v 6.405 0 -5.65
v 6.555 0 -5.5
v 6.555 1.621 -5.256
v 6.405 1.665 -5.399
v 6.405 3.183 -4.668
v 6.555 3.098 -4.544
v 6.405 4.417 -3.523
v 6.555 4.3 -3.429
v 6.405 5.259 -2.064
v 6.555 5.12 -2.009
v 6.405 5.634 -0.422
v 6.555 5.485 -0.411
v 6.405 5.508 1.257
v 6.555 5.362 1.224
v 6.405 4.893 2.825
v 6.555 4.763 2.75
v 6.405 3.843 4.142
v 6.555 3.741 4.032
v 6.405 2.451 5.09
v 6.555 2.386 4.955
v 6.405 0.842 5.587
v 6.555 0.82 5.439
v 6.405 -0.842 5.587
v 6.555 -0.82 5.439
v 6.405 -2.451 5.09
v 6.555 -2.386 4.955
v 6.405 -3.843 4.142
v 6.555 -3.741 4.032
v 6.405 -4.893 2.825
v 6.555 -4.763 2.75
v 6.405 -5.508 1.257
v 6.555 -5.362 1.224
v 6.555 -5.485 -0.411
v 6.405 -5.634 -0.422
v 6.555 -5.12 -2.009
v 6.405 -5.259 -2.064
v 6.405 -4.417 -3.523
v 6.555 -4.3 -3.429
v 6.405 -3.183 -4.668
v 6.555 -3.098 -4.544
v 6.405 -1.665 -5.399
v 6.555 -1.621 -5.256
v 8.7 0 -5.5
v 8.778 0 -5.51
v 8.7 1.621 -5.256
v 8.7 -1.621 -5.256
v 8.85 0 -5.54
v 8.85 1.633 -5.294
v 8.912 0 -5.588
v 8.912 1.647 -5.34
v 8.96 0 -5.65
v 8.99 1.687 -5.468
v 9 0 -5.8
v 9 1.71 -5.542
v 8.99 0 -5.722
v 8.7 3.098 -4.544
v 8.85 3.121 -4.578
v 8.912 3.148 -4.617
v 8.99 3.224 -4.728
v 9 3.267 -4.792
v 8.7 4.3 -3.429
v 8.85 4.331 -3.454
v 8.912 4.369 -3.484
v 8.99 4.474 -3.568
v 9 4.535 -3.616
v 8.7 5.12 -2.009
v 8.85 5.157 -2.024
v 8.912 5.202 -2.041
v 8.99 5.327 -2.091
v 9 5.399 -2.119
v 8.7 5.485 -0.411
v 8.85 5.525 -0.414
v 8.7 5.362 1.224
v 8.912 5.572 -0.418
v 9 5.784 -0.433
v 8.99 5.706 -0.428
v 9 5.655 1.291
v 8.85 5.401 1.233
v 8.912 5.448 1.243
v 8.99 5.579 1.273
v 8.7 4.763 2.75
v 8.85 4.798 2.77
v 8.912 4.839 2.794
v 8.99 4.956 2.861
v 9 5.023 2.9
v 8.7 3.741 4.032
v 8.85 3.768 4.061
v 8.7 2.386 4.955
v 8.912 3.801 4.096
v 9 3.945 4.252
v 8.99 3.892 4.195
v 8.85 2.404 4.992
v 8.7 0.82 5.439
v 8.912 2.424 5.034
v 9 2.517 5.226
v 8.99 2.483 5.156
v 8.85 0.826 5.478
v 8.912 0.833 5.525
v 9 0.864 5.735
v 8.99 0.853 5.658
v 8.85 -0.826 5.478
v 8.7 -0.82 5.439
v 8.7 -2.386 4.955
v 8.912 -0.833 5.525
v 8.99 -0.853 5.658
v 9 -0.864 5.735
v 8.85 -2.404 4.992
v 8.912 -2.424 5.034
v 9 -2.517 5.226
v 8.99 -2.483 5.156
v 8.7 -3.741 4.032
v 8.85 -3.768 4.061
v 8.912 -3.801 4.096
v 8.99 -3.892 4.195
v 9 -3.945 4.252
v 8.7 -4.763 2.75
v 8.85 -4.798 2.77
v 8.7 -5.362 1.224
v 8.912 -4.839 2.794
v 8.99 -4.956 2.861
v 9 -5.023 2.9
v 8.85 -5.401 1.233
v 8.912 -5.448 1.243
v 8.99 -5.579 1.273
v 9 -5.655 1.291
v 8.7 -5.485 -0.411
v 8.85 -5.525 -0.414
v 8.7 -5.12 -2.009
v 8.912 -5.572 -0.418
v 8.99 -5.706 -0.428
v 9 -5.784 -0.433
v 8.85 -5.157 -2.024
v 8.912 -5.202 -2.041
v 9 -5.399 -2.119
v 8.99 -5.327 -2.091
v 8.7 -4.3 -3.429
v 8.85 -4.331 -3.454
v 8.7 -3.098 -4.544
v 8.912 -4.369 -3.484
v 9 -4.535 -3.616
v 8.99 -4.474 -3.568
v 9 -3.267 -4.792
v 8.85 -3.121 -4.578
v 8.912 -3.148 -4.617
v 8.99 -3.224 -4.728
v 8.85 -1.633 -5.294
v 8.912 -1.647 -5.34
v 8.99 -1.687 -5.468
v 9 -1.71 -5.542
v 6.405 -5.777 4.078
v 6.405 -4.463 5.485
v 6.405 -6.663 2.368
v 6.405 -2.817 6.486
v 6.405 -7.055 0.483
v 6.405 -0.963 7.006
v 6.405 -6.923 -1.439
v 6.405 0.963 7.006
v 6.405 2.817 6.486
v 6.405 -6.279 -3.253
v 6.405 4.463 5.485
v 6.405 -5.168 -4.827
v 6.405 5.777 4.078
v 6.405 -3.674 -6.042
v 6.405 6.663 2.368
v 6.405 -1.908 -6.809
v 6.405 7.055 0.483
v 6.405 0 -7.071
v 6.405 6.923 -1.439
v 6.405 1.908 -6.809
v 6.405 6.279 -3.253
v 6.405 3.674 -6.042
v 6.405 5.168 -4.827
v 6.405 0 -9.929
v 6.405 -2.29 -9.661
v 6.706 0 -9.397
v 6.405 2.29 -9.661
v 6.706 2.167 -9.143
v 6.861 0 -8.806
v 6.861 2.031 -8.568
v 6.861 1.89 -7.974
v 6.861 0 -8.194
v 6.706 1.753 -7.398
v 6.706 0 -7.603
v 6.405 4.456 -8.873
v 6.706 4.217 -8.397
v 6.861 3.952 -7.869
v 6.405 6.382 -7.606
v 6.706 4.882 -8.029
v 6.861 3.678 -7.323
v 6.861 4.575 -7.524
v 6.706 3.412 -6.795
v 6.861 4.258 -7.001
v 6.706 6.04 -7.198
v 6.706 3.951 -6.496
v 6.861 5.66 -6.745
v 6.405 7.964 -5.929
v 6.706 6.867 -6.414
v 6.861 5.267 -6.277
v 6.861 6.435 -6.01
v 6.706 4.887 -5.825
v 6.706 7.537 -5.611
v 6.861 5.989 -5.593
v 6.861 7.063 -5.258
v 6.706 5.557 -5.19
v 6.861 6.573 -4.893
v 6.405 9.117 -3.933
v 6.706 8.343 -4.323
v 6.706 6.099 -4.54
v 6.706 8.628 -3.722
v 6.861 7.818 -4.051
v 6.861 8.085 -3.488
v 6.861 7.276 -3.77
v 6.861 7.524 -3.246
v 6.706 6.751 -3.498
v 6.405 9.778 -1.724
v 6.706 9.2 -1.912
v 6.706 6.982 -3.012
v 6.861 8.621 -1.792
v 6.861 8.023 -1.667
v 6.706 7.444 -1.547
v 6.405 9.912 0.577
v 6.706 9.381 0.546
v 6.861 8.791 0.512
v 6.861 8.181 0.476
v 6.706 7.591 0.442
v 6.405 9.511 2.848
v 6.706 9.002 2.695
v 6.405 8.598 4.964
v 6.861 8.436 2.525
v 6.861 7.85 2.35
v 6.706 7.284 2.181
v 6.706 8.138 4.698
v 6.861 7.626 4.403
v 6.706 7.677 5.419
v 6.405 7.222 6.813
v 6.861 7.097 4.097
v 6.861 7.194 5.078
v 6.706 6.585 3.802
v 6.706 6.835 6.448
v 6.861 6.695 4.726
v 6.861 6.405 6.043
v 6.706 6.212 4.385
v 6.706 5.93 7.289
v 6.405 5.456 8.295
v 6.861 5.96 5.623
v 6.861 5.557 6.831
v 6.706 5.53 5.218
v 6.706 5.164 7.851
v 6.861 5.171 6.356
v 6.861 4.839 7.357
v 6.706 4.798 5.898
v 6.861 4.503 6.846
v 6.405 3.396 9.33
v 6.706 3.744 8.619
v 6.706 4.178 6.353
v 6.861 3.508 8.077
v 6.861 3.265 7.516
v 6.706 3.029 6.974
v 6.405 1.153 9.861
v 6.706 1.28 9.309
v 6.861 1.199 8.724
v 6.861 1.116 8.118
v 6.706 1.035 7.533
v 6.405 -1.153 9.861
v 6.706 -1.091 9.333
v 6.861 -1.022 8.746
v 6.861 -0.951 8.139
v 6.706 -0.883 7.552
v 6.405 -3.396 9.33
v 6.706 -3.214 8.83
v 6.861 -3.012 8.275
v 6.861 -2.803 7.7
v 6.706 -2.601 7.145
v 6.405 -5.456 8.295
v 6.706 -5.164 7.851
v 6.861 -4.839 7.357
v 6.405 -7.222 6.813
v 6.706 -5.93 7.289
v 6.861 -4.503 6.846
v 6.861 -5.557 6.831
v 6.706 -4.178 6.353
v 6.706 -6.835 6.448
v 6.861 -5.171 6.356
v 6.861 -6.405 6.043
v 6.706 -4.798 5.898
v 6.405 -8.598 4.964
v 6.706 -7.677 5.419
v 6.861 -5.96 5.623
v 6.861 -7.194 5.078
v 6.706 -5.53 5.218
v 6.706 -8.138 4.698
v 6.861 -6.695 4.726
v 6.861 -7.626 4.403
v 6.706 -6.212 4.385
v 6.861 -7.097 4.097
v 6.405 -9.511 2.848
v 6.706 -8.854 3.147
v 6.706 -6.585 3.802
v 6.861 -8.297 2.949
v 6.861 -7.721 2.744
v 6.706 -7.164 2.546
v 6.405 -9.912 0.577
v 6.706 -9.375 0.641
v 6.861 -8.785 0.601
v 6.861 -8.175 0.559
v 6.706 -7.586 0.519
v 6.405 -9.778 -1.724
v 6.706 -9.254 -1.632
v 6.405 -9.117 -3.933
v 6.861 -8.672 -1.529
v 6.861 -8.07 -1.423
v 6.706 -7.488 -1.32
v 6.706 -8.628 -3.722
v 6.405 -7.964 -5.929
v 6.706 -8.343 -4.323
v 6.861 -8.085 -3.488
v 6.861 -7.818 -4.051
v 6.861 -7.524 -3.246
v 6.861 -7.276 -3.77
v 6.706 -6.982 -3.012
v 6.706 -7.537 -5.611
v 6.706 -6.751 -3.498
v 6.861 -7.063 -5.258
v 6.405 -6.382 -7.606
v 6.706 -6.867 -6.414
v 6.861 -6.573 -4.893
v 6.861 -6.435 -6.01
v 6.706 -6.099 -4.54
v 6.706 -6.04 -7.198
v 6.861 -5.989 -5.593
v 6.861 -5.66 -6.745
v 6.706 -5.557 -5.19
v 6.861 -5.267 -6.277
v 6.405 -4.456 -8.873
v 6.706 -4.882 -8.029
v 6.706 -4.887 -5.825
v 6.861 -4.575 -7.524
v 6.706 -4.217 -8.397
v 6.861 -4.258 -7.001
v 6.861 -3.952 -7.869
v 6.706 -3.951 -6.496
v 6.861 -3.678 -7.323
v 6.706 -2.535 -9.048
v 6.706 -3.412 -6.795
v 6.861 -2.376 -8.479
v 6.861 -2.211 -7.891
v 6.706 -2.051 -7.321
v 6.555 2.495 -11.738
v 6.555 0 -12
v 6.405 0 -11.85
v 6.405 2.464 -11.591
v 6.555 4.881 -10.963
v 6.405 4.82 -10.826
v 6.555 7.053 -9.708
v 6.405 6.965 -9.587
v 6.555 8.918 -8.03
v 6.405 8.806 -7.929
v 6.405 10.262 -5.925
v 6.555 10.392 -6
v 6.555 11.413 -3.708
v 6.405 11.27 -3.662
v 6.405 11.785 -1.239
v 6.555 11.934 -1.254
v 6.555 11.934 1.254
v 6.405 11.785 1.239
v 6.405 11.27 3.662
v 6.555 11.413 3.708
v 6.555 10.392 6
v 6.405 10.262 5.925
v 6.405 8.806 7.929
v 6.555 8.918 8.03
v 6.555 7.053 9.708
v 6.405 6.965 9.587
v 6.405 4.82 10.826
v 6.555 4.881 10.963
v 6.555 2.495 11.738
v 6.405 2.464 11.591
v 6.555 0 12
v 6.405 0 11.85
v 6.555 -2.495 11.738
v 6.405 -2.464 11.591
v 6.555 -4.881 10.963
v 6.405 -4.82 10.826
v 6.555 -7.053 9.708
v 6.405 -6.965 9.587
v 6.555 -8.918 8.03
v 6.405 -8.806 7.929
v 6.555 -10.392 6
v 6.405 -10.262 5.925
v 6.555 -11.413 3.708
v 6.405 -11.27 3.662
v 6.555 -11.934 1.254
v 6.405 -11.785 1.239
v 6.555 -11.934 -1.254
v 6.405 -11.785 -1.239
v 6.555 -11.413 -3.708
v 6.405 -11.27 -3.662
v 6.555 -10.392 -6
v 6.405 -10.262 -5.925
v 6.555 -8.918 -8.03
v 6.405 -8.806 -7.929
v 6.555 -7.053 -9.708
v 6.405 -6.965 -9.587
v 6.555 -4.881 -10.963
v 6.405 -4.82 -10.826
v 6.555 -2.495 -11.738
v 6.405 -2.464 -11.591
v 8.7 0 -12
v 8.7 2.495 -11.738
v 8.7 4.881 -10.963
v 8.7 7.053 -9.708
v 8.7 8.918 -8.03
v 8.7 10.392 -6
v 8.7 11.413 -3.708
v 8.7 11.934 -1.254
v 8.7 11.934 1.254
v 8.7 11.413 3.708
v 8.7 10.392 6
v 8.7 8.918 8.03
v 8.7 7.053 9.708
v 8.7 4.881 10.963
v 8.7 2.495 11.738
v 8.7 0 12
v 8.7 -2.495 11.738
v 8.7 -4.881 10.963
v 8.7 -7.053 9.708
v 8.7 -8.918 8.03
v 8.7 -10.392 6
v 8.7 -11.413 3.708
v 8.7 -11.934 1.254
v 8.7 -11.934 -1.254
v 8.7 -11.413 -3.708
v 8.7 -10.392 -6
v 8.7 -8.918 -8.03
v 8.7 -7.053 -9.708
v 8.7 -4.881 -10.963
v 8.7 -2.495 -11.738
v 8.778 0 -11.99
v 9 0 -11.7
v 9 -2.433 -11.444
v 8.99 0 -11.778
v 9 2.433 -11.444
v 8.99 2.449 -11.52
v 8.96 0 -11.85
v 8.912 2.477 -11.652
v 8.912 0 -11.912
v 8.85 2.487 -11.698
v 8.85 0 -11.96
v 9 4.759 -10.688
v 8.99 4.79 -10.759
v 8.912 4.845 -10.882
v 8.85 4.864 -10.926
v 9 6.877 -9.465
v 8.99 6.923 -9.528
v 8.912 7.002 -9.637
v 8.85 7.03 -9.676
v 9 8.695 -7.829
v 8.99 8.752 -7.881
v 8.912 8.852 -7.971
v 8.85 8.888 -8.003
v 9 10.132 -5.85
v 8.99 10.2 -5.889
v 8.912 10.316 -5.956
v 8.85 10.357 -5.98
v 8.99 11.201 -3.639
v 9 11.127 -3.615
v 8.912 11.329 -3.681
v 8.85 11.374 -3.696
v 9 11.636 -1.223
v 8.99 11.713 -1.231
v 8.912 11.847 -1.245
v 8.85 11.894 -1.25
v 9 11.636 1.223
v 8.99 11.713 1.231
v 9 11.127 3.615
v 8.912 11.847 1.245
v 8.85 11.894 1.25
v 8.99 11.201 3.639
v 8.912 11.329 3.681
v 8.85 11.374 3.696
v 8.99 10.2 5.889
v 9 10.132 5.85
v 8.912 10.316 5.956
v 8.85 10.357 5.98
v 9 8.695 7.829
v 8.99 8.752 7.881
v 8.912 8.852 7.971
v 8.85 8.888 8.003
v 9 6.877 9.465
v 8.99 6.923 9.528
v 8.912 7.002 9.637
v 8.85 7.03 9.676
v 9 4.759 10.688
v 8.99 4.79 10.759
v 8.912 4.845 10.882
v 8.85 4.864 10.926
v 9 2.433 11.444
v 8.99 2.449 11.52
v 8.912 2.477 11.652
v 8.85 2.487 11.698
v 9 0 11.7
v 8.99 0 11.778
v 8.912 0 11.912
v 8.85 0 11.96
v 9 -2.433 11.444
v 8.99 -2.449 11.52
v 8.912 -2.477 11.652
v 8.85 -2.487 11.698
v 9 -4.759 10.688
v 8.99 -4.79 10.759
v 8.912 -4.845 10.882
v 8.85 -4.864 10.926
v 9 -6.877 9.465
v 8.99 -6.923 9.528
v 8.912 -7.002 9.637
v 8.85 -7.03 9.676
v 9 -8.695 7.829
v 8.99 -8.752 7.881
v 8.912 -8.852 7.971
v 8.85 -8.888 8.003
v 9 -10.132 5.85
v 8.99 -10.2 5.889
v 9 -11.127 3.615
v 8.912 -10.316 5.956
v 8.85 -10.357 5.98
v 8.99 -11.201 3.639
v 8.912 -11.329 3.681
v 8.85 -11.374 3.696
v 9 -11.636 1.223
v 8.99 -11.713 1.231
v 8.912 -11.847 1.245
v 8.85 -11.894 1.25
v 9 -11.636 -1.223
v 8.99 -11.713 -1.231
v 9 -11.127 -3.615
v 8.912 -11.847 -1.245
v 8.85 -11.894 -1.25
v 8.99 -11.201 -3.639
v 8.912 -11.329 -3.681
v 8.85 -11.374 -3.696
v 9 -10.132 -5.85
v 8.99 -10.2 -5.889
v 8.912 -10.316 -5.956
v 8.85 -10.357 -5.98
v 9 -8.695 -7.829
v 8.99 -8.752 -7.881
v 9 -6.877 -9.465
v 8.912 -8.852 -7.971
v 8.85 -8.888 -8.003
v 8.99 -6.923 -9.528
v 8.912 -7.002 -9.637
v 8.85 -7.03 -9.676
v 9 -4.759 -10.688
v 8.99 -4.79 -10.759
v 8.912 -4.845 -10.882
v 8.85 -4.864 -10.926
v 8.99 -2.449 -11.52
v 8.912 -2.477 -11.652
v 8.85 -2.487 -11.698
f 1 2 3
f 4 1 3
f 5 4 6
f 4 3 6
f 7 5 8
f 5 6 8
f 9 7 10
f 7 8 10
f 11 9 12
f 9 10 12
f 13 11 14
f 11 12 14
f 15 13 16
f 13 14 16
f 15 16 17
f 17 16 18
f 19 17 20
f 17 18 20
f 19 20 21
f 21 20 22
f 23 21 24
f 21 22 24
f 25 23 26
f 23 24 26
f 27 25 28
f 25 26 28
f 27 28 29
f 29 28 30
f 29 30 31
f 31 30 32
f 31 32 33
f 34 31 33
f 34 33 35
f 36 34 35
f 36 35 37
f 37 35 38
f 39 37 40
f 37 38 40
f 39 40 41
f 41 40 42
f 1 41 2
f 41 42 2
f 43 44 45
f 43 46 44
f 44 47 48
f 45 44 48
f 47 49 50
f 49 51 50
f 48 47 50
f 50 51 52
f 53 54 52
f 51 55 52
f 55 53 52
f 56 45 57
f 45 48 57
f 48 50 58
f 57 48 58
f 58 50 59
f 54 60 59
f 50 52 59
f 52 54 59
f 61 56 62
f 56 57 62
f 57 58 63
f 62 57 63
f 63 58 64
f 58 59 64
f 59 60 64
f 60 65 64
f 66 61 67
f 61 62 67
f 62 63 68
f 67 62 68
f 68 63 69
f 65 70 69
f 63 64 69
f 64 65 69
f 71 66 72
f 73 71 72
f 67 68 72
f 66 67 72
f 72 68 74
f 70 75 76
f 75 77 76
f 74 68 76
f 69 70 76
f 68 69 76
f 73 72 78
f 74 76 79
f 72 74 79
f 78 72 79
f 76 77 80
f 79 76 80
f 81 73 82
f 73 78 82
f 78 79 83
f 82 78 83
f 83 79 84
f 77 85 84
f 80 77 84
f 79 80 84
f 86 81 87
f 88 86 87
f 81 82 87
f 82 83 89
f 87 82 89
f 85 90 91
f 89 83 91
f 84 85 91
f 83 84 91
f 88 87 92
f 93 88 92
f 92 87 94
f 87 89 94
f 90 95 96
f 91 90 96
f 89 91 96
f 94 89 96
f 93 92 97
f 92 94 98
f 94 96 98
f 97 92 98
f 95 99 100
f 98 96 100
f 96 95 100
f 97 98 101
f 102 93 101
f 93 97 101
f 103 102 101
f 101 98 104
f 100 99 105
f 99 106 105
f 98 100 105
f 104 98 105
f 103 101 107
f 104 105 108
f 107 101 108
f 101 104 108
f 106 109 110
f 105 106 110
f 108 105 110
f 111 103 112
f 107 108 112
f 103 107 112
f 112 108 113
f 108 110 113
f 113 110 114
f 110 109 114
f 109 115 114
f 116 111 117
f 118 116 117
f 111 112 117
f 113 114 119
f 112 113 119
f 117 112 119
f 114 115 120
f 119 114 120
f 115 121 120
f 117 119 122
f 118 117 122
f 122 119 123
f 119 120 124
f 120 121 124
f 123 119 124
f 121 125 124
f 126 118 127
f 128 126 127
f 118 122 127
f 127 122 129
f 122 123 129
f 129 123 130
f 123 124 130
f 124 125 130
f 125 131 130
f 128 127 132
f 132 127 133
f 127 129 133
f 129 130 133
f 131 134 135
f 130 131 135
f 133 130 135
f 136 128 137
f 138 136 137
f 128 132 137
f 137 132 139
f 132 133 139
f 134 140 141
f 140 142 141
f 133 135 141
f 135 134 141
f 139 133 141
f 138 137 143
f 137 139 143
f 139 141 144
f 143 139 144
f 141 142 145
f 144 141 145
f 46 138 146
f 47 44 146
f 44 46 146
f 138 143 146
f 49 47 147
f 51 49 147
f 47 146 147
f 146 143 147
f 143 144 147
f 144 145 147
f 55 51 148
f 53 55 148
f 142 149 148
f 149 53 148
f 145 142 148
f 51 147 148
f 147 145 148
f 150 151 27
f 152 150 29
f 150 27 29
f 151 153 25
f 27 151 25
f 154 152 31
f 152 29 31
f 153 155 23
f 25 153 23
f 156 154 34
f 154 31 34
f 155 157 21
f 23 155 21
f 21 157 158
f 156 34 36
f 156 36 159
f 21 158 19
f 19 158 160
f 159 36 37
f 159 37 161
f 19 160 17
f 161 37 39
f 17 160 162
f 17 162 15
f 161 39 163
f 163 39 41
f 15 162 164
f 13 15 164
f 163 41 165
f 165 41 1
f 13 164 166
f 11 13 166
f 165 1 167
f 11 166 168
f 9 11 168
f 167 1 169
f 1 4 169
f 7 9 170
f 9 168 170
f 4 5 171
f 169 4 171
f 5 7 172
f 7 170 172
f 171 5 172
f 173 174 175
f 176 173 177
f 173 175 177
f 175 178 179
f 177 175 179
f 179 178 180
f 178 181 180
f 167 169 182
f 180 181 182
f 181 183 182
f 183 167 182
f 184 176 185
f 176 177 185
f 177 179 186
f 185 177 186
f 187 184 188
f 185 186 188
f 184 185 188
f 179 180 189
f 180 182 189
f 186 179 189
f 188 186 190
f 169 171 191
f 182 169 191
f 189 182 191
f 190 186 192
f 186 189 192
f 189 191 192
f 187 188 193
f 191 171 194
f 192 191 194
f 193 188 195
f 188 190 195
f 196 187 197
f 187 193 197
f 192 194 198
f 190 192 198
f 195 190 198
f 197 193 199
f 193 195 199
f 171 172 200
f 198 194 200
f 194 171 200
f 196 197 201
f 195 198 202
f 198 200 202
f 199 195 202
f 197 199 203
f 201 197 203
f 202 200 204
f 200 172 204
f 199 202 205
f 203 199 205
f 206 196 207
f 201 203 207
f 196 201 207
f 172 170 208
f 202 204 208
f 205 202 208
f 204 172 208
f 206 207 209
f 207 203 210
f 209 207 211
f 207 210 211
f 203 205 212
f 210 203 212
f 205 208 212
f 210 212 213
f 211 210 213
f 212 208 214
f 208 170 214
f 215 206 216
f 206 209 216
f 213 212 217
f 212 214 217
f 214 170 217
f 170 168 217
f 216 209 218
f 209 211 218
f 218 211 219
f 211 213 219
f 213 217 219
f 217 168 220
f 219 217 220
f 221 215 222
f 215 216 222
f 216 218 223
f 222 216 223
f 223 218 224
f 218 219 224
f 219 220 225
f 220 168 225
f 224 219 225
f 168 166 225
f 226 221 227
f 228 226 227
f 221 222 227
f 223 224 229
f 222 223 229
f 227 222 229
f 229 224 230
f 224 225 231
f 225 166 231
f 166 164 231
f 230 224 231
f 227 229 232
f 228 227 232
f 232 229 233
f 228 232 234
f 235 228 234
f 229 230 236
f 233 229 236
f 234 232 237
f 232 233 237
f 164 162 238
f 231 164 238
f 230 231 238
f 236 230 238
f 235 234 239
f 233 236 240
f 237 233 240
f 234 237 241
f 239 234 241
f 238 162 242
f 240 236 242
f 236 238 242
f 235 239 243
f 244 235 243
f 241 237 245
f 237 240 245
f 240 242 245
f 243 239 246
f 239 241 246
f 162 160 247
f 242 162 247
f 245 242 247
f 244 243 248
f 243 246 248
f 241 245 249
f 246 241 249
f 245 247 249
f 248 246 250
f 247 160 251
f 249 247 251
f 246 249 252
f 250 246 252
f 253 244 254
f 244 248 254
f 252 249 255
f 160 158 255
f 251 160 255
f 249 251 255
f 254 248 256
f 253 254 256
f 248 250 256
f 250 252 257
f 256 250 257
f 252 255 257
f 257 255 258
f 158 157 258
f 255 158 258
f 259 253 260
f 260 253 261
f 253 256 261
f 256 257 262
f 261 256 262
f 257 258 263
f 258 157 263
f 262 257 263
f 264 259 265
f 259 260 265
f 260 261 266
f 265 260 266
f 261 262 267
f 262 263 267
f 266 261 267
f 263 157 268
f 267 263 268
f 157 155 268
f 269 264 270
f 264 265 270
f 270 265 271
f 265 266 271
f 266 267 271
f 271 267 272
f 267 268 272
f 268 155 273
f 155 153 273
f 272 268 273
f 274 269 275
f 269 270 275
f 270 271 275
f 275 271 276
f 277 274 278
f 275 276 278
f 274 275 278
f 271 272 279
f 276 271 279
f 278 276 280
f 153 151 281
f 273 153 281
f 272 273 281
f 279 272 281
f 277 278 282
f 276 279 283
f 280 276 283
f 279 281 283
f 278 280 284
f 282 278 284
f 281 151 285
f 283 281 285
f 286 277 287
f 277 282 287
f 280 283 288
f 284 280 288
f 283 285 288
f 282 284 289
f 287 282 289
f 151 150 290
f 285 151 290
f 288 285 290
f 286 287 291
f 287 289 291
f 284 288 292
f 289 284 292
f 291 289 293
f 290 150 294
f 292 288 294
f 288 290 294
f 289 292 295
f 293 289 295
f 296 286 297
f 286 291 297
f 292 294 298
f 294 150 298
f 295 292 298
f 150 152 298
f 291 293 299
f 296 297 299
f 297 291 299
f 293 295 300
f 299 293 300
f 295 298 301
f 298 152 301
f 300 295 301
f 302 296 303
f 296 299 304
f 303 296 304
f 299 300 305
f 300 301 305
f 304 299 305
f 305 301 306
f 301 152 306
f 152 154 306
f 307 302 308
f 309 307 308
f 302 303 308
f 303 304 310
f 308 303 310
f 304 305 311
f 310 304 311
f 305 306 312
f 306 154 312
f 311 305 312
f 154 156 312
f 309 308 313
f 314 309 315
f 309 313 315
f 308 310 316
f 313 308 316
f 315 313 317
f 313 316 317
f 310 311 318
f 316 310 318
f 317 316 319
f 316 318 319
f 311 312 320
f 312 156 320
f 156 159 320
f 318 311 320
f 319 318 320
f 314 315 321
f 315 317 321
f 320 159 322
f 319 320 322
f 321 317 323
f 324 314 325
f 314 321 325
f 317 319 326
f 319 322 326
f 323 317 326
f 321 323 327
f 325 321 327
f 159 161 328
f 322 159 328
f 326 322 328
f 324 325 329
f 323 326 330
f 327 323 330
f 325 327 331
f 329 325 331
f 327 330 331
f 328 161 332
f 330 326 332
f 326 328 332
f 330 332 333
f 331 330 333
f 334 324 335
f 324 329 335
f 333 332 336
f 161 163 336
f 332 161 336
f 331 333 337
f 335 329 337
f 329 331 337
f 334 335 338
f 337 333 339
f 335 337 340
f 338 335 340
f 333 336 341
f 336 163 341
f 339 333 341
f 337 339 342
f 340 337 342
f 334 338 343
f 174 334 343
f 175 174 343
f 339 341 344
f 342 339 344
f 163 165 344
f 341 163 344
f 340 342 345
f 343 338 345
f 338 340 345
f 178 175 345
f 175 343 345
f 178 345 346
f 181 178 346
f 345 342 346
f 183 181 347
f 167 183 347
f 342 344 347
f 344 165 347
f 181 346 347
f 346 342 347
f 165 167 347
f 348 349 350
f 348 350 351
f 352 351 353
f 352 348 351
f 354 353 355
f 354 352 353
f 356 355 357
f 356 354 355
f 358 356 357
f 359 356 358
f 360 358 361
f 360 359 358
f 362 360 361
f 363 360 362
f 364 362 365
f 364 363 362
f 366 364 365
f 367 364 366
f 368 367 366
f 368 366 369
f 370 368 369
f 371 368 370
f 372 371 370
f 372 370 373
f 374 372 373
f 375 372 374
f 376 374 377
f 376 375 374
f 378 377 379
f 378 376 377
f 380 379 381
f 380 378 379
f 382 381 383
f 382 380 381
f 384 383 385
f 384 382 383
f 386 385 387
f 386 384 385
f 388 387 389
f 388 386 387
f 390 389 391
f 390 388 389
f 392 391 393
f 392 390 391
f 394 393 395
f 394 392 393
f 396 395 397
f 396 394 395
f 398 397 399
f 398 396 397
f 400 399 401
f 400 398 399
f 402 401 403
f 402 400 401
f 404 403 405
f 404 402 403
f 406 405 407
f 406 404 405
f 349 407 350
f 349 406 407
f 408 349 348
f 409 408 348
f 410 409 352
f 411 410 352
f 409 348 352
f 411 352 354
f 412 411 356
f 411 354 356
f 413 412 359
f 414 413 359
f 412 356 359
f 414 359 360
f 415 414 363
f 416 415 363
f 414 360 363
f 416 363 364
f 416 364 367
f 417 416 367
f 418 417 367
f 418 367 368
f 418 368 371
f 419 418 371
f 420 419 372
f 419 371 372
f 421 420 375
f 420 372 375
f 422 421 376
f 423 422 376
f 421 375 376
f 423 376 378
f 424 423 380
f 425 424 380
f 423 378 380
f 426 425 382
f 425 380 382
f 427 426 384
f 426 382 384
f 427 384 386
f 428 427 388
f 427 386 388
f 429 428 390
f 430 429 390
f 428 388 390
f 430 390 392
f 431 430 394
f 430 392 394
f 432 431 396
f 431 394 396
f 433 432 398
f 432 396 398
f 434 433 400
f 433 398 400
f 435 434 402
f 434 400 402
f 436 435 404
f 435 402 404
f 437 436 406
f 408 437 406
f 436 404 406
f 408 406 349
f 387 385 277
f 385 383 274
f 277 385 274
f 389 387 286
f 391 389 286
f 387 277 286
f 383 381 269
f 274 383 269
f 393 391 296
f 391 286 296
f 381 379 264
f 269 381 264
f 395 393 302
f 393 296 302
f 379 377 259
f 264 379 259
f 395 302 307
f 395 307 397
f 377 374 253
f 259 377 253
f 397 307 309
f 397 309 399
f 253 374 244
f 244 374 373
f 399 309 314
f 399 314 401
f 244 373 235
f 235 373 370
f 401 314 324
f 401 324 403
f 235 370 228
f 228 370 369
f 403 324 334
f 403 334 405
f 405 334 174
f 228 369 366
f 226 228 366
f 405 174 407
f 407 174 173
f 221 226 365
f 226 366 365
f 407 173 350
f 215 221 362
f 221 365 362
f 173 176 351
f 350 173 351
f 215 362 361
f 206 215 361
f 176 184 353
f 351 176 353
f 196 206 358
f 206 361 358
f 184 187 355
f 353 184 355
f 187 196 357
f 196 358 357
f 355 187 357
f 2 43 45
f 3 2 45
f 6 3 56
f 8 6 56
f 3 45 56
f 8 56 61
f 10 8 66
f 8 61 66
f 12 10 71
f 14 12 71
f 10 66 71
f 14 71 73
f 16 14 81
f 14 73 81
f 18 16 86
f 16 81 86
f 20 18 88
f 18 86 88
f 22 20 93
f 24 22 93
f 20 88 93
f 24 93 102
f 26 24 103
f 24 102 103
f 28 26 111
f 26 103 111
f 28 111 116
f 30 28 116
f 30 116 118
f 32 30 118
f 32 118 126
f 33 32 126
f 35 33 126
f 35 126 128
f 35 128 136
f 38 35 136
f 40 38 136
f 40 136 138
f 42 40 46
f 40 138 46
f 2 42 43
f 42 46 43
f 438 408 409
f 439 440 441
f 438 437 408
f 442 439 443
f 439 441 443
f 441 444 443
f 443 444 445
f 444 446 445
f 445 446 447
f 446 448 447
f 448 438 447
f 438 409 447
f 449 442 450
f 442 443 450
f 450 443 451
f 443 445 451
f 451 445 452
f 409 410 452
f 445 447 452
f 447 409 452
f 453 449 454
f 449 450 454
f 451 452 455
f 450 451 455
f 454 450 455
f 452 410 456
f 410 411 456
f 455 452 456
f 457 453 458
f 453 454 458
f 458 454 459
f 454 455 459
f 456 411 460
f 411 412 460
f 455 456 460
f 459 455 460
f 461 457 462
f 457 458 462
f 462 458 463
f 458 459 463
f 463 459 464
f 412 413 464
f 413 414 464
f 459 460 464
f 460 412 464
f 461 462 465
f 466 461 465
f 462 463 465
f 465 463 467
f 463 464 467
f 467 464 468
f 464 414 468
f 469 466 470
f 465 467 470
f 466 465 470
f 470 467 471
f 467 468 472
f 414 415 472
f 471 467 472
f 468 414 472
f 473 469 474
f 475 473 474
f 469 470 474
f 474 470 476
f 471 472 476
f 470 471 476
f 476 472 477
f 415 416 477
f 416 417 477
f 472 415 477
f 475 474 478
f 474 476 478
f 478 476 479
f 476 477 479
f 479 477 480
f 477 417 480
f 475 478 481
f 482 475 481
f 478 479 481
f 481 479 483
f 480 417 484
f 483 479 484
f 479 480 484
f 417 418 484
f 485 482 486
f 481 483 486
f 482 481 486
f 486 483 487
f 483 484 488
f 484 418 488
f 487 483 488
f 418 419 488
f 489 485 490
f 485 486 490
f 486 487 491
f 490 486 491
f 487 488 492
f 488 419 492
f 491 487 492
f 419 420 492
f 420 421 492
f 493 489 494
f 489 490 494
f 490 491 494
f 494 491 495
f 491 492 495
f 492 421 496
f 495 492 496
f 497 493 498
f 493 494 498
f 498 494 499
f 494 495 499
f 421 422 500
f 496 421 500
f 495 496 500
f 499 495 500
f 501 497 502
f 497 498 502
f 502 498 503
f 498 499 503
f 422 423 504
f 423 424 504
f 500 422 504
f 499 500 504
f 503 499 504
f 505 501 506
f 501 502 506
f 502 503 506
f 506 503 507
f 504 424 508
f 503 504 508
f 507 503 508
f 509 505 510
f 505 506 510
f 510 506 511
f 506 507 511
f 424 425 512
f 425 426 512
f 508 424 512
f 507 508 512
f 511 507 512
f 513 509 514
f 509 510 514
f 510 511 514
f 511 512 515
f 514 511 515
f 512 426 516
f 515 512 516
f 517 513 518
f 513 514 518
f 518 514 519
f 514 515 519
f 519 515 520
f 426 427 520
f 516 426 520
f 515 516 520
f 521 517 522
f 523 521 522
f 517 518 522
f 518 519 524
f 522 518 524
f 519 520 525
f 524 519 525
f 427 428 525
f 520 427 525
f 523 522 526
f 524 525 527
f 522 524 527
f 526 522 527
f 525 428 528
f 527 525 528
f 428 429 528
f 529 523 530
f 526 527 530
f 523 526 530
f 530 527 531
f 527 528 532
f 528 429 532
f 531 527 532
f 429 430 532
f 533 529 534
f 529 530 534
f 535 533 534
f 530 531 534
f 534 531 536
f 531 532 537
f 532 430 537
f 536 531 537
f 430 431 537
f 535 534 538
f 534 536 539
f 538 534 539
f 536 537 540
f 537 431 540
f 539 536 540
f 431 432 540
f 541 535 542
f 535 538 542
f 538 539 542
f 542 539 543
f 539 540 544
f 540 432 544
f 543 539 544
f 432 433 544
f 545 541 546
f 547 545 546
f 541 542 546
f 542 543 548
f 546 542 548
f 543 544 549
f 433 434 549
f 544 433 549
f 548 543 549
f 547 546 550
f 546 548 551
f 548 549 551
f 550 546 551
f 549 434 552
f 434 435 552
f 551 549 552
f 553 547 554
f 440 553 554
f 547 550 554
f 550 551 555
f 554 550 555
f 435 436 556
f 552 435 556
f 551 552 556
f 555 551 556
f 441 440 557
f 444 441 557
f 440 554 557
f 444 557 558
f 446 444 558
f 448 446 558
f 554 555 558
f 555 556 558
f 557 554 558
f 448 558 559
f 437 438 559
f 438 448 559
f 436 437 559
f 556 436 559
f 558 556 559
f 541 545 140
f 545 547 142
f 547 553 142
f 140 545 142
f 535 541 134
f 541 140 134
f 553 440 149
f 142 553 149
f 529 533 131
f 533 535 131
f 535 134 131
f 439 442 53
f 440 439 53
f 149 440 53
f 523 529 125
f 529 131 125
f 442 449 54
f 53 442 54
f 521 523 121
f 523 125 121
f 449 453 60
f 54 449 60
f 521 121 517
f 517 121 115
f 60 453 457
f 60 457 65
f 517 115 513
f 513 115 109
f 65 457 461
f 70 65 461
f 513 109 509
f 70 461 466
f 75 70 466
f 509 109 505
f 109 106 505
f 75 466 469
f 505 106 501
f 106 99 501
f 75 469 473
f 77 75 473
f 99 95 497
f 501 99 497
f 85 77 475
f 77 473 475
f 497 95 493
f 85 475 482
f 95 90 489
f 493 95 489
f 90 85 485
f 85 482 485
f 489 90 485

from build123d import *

# Parameters (mm, degrees)
CHAMFER_1_SIZE = 0.15


with BuildPart() as part:
    # Эскиз1 → Повернуть1 (revolve)
    with BuildSketch(Plane.XY, mode=Mode.PRIVATE) as revolve_1_sk:
        with BuildLine():
            Line((6.4048, 12), (6.4048, 9.9286))
            ThreePointArc((6.4048, 9.9286), (6.881, 8.5), (6.4048, 7.0714))
            Line((6.4048, 7.0714), (6.4048, 5.5))
            Line((6.4048, 5.5), (8.7, 5.5))
            ThreePointArc((8.7, 5.5), (8.912132034, 5.587867966), (9, 5.8))
            Line((9, 5.8), (9, 11.7))
            ThreePointArc((9, 11.7), (8.912132034, 11.912132034), (8.7, 12))
            Line((8.7, 12), (6.4048, 12))
        make_face()
    revolve(revolve_1_sk.sketch.rotate(Axis((6.4048, 0, 0), (1, 0, 0)), 270), axis=Axis((6.4048, 0, 0), (1, 0, 0)))

    # Фаска1
    chamfer_1_edges = [part.edges().sort_by_distance(p)[0] for p in [
        (6.4048, 0, 12),
        (6.4048, 0, 5.5),
    ]]
    chamfer(chamfer_1_edges, length=CHAMFER_1_SIZE)


solid = part.part
